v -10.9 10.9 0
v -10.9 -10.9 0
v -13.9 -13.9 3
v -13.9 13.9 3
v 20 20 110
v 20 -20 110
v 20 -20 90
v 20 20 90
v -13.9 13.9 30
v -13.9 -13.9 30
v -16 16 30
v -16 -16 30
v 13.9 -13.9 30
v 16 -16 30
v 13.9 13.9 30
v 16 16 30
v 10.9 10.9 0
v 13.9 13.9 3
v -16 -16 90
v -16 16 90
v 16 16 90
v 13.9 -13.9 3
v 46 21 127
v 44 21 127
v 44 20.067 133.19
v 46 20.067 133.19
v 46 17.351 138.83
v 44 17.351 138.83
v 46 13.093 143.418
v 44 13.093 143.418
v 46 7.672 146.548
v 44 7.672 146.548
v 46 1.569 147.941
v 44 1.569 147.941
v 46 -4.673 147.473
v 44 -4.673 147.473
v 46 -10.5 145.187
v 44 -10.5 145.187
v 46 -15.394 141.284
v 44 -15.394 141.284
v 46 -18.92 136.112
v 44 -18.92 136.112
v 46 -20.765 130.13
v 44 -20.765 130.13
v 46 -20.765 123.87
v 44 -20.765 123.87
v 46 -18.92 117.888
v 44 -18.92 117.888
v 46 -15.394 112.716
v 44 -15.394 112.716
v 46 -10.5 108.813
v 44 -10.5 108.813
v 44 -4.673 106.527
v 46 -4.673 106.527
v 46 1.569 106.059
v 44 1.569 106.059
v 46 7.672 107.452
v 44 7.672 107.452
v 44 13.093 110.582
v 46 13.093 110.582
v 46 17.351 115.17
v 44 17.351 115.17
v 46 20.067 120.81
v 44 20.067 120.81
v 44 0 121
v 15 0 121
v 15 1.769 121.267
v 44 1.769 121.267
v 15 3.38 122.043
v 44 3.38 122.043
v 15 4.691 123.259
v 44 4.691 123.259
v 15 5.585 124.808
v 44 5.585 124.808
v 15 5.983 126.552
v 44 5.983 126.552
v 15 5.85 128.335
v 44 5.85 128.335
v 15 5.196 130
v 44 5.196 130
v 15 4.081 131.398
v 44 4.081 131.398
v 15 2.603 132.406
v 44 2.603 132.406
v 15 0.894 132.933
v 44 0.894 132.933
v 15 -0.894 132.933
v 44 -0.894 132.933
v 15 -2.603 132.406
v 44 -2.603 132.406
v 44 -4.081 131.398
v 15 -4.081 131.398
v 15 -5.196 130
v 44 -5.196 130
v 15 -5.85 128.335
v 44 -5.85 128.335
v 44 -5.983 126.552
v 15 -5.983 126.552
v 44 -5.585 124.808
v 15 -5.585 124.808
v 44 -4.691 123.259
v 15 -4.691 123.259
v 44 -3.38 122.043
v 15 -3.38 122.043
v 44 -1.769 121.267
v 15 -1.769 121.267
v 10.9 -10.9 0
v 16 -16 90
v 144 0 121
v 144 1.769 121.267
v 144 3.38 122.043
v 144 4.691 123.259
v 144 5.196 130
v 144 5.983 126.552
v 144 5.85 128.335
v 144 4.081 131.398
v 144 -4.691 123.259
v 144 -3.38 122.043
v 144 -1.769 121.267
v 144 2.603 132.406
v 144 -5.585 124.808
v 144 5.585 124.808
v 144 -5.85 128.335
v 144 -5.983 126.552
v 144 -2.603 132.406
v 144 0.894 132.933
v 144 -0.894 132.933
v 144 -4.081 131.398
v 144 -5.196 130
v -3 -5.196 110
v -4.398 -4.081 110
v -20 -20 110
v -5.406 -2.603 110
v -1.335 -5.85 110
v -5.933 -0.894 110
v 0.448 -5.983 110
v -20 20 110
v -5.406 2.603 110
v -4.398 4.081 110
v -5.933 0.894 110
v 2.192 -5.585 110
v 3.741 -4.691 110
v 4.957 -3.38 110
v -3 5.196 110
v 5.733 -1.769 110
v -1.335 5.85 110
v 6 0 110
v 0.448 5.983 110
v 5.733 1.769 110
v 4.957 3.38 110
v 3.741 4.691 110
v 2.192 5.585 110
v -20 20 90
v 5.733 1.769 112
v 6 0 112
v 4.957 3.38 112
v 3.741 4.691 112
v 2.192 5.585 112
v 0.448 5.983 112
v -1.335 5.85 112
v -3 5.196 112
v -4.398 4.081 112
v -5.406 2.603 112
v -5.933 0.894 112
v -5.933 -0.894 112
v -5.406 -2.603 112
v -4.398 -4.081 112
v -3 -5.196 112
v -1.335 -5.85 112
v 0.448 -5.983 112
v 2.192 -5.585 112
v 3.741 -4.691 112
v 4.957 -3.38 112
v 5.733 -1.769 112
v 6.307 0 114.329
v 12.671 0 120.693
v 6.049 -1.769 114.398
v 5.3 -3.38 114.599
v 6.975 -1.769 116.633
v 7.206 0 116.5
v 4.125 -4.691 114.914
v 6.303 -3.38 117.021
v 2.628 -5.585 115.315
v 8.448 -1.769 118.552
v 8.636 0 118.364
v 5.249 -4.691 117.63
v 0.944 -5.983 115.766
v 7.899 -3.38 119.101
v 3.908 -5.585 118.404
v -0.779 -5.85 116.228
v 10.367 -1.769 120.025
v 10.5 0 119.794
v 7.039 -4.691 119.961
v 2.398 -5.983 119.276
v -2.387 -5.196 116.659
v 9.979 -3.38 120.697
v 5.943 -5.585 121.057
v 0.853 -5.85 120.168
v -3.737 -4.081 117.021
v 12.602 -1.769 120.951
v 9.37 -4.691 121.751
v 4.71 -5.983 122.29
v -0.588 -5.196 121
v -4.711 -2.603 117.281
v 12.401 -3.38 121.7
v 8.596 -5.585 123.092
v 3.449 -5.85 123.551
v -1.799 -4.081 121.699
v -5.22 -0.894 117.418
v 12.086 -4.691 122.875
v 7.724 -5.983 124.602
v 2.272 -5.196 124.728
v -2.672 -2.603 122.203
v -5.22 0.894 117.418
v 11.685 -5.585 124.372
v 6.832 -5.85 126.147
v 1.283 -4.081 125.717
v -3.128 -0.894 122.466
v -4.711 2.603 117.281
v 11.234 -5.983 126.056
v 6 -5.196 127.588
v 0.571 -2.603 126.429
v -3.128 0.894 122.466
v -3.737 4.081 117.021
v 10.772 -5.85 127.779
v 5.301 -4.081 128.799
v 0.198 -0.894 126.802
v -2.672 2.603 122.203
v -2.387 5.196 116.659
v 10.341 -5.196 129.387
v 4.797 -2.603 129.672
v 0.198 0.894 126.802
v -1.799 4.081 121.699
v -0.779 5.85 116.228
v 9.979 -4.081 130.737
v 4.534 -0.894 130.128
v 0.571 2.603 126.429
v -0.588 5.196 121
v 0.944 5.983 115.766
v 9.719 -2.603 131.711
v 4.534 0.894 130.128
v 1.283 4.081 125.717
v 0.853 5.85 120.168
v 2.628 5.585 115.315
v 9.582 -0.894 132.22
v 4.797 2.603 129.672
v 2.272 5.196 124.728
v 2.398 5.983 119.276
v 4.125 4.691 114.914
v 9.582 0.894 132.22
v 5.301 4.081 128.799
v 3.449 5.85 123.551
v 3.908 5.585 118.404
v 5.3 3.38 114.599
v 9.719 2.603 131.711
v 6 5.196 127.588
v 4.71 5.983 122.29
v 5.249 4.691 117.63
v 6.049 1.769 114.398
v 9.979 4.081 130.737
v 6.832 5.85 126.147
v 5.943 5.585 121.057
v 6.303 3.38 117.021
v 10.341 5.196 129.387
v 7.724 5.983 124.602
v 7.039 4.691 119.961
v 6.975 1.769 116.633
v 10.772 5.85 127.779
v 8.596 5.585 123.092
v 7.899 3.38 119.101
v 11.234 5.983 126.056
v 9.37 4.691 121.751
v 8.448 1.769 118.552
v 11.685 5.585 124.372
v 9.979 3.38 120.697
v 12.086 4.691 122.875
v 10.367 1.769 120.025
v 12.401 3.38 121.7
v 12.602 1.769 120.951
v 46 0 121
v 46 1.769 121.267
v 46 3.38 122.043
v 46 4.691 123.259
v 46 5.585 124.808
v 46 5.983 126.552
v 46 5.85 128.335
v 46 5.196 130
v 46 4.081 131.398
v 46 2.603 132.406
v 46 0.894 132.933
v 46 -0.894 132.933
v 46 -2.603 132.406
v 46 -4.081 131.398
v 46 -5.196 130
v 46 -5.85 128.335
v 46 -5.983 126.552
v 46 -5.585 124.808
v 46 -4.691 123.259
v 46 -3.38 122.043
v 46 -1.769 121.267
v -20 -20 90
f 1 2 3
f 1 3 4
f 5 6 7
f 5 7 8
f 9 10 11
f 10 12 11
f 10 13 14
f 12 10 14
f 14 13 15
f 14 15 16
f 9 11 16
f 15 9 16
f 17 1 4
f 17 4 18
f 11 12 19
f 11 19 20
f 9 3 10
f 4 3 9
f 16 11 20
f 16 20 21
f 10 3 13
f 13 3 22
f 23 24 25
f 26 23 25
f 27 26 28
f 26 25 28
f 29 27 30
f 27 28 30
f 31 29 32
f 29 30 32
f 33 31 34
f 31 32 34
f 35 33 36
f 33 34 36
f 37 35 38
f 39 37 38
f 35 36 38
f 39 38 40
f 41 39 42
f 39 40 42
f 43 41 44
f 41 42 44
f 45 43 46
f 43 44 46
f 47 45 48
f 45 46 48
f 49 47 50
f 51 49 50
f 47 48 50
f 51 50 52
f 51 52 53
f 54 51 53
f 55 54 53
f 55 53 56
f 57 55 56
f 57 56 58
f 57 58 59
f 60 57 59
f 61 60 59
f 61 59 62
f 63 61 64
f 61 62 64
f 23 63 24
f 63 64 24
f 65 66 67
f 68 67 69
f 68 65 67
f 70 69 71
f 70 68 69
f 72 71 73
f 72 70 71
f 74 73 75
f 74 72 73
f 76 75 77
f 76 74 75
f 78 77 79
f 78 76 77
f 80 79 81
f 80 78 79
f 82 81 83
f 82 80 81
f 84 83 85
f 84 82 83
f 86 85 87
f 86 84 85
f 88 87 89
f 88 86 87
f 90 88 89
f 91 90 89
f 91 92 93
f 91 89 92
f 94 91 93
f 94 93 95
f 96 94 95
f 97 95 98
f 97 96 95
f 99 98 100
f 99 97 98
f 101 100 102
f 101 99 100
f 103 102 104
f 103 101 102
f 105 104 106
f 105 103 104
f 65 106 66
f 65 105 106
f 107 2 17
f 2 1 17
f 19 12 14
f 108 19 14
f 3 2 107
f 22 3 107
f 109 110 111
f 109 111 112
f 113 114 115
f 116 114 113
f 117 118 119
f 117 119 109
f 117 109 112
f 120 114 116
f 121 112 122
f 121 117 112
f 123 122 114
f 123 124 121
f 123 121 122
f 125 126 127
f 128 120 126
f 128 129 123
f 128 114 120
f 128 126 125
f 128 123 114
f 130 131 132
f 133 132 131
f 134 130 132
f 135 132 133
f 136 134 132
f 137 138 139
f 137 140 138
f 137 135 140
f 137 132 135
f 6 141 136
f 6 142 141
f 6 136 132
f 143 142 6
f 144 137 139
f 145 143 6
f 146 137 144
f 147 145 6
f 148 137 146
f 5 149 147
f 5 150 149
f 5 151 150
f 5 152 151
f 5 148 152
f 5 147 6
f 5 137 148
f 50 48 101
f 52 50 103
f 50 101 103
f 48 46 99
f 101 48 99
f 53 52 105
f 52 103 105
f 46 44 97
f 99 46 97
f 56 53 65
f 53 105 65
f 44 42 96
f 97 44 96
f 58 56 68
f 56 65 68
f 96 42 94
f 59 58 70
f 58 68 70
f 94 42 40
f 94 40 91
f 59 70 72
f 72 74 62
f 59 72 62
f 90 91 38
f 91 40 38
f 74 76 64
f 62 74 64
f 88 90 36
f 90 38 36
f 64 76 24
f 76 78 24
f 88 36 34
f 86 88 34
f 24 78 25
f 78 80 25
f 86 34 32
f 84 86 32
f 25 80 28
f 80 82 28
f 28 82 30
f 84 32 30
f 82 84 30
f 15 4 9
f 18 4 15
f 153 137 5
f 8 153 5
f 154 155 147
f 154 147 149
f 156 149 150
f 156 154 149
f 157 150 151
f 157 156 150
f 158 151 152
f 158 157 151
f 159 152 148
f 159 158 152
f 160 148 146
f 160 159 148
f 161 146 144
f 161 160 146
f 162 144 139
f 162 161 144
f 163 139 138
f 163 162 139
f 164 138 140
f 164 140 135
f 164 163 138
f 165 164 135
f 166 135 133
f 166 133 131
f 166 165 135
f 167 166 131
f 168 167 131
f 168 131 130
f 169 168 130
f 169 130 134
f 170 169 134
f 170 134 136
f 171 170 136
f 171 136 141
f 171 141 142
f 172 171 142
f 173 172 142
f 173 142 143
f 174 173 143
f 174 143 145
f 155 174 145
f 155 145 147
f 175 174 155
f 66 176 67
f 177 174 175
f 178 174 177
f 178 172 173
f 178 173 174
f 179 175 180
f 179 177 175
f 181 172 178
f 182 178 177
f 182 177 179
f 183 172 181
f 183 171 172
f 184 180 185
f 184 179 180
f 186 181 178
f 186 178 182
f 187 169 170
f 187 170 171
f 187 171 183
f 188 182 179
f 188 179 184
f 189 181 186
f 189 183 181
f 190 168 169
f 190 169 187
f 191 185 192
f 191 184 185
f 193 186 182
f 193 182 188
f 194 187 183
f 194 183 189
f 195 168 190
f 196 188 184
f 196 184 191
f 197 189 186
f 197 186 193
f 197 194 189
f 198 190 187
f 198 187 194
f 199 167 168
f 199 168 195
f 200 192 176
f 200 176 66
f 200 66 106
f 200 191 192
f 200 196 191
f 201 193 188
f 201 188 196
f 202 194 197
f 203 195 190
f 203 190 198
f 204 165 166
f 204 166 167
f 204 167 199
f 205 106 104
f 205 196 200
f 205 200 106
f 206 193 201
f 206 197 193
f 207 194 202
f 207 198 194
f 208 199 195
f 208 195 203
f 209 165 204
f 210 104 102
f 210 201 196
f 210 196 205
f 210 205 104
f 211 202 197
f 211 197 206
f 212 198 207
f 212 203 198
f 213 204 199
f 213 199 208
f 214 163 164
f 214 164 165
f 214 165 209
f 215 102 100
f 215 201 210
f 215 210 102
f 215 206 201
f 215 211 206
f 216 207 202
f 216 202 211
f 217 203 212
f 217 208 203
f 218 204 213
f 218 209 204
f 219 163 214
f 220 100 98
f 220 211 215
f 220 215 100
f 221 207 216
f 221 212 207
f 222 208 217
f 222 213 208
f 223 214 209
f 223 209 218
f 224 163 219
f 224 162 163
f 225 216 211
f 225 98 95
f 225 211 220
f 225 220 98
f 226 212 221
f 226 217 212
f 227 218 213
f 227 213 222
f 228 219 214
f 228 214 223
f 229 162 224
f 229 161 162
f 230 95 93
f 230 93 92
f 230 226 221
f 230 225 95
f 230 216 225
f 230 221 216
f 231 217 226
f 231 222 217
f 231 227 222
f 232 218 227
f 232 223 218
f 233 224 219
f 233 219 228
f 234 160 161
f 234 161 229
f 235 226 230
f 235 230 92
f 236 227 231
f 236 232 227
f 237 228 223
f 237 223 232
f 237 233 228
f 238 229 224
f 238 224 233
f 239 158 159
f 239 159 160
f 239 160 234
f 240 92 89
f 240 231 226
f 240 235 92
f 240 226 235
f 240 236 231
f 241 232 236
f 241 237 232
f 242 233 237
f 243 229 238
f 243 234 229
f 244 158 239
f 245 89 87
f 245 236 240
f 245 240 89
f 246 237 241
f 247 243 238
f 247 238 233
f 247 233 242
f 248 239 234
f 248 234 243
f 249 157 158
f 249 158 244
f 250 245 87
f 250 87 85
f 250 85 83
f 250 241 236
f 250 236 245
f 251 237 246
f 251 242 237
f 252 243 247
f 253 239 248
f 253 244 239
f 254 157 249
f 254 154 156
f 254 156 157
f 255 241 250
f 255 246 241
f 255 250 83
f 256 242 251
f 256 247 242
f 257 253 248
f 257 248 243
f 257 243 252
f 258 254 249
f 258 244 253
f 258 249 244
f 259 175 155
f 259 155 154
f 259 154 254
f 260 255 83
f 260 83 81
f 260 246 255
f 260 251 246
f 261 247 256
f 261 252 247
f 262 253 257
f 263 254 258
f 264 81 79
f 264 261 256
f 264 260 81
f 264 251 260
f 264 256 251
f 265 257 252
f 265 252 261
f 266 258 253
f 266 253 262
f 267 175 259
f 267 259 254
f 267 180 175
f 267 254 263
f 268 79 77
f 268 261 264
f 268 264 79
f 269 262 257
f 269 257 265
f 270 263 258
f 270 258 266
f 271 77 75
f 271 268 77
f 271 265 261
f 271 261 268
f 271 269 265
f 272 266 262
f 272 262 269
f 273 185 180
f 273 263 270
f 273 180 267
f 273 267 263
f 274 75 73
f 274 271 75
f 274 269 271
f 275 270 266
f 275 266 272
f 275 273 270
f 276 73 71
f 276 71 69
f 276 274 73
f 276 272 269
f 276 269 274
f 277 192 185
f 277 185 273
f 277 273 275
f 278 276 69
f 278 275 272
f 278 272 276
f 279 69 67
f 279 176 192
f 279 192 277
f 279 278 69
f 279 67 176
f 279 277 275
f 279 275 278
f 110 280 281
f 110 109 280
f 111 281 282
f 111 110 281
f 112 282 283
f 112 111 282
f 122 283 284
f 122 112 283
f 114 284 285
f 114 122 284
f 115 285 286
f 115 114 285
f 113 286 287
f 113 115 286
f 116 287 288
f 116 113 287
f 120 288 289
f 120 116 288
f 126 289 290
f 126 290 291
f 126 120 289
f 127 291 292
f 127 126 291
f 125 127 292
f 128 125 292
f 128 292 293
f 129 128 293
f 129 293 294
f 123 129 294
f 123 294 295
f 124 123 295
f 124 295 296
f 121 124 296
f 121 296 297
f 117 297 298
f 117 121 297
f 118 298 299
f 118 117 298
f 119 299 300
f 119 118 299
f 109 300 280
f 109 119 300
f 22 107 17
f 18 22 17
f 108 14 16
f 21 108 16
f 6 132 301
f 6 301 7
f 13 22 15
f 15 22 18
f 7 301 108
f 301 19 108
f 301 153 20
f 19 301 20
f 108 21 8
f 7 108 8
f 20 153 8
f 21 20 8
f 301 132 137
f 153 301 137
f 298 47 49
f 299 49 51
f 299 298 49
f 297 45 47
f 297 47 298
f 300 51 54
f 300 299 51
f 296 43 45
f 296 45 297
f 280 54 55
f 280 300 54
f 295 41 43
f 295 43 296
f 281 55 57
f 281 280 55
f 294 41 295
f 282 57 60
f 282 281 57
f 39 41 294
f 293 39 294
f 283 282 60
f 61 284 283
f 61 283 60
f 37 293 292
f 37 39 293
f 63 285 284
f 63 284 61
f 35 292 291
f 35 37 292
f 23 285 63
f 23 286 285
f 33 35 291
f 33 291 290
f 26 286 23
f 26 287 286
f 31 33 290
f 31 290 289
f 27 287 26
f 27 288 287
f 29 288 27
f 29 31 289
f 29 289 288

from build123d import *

# Parameters (mm, degrees)
F0_W      = 27.8
F0_H      = 27.8
F1_DEPTH  = 30
F2_W      = 32
F2_H      = 32
F2_W_2    = 27.8
F2_H_2    = 27.8
F3_DEPTH  = 80
F4_W      = 40
F4_H      = 40
F5_DEPTH  = 20
F7_R      = 6
F10_R     = 21
F11_DEPTH = 2
F12_SIZE  = 3


with BuildPart() as f1:
    # F0 (on Top) → F1 (new body)
    with BuildSketch(Plane.XY):
        Rectangle(F0_W, F0_H)
    extrude(amount=F1_DEPTH)

    # F2 (on face) → F3 (join)
    with BuildSketch(Plane.XY.offset(30)):
        Rectangle(F2_W, F2_H)
        Rectangle(F2_W_2, F2_H_2, mode=Mode.SUBTRACT)
        Rectangle(F2_W_2, F2_H_2)
    extrude(amount=F3_DEPTH)

    # F4 (on face) → F5 (join)
    with BuildSketch(Plane.XY.offset(110)):
        Rectangle(F4_W, F4_H)
    extrude(amount=-F5_DEPTH)

    # F8: sweep along a path in F6
    with BuildLine(Plane.XZ) as f8_path:
        Line((0, 110), (0, 112))
        ThreePointArc((0, 112), (4.3933982822, 122.6066017178), (15, 127))
        Line((15, 127), (144, 127))
    # F7 (on face) → F8 (sweep)
    with BuildSketch(Plane.XY.offset(110)):
        Circle(F7_R)
    sweep(path=f8_path.line)

    # F10 (on offset) → F11 (join)
    with BuildSketch(Plane.YZ.offset(44)):
        with Locations((0, 127)):
            Circle(F10_R)
    extrude(amount=F11_DEPTH)

    # F12
    f12_edges = [f1.edges().sort_by_distance(p)[0] for p in [
        (0, -13.9, 0),
        (13.9, 0, 0),
        (0, 13.9, 0),
        (-13.9, 0, 0),
    ]]
    chamfer(f12_edges, length=F12_SIZE)


solid = f1.part
